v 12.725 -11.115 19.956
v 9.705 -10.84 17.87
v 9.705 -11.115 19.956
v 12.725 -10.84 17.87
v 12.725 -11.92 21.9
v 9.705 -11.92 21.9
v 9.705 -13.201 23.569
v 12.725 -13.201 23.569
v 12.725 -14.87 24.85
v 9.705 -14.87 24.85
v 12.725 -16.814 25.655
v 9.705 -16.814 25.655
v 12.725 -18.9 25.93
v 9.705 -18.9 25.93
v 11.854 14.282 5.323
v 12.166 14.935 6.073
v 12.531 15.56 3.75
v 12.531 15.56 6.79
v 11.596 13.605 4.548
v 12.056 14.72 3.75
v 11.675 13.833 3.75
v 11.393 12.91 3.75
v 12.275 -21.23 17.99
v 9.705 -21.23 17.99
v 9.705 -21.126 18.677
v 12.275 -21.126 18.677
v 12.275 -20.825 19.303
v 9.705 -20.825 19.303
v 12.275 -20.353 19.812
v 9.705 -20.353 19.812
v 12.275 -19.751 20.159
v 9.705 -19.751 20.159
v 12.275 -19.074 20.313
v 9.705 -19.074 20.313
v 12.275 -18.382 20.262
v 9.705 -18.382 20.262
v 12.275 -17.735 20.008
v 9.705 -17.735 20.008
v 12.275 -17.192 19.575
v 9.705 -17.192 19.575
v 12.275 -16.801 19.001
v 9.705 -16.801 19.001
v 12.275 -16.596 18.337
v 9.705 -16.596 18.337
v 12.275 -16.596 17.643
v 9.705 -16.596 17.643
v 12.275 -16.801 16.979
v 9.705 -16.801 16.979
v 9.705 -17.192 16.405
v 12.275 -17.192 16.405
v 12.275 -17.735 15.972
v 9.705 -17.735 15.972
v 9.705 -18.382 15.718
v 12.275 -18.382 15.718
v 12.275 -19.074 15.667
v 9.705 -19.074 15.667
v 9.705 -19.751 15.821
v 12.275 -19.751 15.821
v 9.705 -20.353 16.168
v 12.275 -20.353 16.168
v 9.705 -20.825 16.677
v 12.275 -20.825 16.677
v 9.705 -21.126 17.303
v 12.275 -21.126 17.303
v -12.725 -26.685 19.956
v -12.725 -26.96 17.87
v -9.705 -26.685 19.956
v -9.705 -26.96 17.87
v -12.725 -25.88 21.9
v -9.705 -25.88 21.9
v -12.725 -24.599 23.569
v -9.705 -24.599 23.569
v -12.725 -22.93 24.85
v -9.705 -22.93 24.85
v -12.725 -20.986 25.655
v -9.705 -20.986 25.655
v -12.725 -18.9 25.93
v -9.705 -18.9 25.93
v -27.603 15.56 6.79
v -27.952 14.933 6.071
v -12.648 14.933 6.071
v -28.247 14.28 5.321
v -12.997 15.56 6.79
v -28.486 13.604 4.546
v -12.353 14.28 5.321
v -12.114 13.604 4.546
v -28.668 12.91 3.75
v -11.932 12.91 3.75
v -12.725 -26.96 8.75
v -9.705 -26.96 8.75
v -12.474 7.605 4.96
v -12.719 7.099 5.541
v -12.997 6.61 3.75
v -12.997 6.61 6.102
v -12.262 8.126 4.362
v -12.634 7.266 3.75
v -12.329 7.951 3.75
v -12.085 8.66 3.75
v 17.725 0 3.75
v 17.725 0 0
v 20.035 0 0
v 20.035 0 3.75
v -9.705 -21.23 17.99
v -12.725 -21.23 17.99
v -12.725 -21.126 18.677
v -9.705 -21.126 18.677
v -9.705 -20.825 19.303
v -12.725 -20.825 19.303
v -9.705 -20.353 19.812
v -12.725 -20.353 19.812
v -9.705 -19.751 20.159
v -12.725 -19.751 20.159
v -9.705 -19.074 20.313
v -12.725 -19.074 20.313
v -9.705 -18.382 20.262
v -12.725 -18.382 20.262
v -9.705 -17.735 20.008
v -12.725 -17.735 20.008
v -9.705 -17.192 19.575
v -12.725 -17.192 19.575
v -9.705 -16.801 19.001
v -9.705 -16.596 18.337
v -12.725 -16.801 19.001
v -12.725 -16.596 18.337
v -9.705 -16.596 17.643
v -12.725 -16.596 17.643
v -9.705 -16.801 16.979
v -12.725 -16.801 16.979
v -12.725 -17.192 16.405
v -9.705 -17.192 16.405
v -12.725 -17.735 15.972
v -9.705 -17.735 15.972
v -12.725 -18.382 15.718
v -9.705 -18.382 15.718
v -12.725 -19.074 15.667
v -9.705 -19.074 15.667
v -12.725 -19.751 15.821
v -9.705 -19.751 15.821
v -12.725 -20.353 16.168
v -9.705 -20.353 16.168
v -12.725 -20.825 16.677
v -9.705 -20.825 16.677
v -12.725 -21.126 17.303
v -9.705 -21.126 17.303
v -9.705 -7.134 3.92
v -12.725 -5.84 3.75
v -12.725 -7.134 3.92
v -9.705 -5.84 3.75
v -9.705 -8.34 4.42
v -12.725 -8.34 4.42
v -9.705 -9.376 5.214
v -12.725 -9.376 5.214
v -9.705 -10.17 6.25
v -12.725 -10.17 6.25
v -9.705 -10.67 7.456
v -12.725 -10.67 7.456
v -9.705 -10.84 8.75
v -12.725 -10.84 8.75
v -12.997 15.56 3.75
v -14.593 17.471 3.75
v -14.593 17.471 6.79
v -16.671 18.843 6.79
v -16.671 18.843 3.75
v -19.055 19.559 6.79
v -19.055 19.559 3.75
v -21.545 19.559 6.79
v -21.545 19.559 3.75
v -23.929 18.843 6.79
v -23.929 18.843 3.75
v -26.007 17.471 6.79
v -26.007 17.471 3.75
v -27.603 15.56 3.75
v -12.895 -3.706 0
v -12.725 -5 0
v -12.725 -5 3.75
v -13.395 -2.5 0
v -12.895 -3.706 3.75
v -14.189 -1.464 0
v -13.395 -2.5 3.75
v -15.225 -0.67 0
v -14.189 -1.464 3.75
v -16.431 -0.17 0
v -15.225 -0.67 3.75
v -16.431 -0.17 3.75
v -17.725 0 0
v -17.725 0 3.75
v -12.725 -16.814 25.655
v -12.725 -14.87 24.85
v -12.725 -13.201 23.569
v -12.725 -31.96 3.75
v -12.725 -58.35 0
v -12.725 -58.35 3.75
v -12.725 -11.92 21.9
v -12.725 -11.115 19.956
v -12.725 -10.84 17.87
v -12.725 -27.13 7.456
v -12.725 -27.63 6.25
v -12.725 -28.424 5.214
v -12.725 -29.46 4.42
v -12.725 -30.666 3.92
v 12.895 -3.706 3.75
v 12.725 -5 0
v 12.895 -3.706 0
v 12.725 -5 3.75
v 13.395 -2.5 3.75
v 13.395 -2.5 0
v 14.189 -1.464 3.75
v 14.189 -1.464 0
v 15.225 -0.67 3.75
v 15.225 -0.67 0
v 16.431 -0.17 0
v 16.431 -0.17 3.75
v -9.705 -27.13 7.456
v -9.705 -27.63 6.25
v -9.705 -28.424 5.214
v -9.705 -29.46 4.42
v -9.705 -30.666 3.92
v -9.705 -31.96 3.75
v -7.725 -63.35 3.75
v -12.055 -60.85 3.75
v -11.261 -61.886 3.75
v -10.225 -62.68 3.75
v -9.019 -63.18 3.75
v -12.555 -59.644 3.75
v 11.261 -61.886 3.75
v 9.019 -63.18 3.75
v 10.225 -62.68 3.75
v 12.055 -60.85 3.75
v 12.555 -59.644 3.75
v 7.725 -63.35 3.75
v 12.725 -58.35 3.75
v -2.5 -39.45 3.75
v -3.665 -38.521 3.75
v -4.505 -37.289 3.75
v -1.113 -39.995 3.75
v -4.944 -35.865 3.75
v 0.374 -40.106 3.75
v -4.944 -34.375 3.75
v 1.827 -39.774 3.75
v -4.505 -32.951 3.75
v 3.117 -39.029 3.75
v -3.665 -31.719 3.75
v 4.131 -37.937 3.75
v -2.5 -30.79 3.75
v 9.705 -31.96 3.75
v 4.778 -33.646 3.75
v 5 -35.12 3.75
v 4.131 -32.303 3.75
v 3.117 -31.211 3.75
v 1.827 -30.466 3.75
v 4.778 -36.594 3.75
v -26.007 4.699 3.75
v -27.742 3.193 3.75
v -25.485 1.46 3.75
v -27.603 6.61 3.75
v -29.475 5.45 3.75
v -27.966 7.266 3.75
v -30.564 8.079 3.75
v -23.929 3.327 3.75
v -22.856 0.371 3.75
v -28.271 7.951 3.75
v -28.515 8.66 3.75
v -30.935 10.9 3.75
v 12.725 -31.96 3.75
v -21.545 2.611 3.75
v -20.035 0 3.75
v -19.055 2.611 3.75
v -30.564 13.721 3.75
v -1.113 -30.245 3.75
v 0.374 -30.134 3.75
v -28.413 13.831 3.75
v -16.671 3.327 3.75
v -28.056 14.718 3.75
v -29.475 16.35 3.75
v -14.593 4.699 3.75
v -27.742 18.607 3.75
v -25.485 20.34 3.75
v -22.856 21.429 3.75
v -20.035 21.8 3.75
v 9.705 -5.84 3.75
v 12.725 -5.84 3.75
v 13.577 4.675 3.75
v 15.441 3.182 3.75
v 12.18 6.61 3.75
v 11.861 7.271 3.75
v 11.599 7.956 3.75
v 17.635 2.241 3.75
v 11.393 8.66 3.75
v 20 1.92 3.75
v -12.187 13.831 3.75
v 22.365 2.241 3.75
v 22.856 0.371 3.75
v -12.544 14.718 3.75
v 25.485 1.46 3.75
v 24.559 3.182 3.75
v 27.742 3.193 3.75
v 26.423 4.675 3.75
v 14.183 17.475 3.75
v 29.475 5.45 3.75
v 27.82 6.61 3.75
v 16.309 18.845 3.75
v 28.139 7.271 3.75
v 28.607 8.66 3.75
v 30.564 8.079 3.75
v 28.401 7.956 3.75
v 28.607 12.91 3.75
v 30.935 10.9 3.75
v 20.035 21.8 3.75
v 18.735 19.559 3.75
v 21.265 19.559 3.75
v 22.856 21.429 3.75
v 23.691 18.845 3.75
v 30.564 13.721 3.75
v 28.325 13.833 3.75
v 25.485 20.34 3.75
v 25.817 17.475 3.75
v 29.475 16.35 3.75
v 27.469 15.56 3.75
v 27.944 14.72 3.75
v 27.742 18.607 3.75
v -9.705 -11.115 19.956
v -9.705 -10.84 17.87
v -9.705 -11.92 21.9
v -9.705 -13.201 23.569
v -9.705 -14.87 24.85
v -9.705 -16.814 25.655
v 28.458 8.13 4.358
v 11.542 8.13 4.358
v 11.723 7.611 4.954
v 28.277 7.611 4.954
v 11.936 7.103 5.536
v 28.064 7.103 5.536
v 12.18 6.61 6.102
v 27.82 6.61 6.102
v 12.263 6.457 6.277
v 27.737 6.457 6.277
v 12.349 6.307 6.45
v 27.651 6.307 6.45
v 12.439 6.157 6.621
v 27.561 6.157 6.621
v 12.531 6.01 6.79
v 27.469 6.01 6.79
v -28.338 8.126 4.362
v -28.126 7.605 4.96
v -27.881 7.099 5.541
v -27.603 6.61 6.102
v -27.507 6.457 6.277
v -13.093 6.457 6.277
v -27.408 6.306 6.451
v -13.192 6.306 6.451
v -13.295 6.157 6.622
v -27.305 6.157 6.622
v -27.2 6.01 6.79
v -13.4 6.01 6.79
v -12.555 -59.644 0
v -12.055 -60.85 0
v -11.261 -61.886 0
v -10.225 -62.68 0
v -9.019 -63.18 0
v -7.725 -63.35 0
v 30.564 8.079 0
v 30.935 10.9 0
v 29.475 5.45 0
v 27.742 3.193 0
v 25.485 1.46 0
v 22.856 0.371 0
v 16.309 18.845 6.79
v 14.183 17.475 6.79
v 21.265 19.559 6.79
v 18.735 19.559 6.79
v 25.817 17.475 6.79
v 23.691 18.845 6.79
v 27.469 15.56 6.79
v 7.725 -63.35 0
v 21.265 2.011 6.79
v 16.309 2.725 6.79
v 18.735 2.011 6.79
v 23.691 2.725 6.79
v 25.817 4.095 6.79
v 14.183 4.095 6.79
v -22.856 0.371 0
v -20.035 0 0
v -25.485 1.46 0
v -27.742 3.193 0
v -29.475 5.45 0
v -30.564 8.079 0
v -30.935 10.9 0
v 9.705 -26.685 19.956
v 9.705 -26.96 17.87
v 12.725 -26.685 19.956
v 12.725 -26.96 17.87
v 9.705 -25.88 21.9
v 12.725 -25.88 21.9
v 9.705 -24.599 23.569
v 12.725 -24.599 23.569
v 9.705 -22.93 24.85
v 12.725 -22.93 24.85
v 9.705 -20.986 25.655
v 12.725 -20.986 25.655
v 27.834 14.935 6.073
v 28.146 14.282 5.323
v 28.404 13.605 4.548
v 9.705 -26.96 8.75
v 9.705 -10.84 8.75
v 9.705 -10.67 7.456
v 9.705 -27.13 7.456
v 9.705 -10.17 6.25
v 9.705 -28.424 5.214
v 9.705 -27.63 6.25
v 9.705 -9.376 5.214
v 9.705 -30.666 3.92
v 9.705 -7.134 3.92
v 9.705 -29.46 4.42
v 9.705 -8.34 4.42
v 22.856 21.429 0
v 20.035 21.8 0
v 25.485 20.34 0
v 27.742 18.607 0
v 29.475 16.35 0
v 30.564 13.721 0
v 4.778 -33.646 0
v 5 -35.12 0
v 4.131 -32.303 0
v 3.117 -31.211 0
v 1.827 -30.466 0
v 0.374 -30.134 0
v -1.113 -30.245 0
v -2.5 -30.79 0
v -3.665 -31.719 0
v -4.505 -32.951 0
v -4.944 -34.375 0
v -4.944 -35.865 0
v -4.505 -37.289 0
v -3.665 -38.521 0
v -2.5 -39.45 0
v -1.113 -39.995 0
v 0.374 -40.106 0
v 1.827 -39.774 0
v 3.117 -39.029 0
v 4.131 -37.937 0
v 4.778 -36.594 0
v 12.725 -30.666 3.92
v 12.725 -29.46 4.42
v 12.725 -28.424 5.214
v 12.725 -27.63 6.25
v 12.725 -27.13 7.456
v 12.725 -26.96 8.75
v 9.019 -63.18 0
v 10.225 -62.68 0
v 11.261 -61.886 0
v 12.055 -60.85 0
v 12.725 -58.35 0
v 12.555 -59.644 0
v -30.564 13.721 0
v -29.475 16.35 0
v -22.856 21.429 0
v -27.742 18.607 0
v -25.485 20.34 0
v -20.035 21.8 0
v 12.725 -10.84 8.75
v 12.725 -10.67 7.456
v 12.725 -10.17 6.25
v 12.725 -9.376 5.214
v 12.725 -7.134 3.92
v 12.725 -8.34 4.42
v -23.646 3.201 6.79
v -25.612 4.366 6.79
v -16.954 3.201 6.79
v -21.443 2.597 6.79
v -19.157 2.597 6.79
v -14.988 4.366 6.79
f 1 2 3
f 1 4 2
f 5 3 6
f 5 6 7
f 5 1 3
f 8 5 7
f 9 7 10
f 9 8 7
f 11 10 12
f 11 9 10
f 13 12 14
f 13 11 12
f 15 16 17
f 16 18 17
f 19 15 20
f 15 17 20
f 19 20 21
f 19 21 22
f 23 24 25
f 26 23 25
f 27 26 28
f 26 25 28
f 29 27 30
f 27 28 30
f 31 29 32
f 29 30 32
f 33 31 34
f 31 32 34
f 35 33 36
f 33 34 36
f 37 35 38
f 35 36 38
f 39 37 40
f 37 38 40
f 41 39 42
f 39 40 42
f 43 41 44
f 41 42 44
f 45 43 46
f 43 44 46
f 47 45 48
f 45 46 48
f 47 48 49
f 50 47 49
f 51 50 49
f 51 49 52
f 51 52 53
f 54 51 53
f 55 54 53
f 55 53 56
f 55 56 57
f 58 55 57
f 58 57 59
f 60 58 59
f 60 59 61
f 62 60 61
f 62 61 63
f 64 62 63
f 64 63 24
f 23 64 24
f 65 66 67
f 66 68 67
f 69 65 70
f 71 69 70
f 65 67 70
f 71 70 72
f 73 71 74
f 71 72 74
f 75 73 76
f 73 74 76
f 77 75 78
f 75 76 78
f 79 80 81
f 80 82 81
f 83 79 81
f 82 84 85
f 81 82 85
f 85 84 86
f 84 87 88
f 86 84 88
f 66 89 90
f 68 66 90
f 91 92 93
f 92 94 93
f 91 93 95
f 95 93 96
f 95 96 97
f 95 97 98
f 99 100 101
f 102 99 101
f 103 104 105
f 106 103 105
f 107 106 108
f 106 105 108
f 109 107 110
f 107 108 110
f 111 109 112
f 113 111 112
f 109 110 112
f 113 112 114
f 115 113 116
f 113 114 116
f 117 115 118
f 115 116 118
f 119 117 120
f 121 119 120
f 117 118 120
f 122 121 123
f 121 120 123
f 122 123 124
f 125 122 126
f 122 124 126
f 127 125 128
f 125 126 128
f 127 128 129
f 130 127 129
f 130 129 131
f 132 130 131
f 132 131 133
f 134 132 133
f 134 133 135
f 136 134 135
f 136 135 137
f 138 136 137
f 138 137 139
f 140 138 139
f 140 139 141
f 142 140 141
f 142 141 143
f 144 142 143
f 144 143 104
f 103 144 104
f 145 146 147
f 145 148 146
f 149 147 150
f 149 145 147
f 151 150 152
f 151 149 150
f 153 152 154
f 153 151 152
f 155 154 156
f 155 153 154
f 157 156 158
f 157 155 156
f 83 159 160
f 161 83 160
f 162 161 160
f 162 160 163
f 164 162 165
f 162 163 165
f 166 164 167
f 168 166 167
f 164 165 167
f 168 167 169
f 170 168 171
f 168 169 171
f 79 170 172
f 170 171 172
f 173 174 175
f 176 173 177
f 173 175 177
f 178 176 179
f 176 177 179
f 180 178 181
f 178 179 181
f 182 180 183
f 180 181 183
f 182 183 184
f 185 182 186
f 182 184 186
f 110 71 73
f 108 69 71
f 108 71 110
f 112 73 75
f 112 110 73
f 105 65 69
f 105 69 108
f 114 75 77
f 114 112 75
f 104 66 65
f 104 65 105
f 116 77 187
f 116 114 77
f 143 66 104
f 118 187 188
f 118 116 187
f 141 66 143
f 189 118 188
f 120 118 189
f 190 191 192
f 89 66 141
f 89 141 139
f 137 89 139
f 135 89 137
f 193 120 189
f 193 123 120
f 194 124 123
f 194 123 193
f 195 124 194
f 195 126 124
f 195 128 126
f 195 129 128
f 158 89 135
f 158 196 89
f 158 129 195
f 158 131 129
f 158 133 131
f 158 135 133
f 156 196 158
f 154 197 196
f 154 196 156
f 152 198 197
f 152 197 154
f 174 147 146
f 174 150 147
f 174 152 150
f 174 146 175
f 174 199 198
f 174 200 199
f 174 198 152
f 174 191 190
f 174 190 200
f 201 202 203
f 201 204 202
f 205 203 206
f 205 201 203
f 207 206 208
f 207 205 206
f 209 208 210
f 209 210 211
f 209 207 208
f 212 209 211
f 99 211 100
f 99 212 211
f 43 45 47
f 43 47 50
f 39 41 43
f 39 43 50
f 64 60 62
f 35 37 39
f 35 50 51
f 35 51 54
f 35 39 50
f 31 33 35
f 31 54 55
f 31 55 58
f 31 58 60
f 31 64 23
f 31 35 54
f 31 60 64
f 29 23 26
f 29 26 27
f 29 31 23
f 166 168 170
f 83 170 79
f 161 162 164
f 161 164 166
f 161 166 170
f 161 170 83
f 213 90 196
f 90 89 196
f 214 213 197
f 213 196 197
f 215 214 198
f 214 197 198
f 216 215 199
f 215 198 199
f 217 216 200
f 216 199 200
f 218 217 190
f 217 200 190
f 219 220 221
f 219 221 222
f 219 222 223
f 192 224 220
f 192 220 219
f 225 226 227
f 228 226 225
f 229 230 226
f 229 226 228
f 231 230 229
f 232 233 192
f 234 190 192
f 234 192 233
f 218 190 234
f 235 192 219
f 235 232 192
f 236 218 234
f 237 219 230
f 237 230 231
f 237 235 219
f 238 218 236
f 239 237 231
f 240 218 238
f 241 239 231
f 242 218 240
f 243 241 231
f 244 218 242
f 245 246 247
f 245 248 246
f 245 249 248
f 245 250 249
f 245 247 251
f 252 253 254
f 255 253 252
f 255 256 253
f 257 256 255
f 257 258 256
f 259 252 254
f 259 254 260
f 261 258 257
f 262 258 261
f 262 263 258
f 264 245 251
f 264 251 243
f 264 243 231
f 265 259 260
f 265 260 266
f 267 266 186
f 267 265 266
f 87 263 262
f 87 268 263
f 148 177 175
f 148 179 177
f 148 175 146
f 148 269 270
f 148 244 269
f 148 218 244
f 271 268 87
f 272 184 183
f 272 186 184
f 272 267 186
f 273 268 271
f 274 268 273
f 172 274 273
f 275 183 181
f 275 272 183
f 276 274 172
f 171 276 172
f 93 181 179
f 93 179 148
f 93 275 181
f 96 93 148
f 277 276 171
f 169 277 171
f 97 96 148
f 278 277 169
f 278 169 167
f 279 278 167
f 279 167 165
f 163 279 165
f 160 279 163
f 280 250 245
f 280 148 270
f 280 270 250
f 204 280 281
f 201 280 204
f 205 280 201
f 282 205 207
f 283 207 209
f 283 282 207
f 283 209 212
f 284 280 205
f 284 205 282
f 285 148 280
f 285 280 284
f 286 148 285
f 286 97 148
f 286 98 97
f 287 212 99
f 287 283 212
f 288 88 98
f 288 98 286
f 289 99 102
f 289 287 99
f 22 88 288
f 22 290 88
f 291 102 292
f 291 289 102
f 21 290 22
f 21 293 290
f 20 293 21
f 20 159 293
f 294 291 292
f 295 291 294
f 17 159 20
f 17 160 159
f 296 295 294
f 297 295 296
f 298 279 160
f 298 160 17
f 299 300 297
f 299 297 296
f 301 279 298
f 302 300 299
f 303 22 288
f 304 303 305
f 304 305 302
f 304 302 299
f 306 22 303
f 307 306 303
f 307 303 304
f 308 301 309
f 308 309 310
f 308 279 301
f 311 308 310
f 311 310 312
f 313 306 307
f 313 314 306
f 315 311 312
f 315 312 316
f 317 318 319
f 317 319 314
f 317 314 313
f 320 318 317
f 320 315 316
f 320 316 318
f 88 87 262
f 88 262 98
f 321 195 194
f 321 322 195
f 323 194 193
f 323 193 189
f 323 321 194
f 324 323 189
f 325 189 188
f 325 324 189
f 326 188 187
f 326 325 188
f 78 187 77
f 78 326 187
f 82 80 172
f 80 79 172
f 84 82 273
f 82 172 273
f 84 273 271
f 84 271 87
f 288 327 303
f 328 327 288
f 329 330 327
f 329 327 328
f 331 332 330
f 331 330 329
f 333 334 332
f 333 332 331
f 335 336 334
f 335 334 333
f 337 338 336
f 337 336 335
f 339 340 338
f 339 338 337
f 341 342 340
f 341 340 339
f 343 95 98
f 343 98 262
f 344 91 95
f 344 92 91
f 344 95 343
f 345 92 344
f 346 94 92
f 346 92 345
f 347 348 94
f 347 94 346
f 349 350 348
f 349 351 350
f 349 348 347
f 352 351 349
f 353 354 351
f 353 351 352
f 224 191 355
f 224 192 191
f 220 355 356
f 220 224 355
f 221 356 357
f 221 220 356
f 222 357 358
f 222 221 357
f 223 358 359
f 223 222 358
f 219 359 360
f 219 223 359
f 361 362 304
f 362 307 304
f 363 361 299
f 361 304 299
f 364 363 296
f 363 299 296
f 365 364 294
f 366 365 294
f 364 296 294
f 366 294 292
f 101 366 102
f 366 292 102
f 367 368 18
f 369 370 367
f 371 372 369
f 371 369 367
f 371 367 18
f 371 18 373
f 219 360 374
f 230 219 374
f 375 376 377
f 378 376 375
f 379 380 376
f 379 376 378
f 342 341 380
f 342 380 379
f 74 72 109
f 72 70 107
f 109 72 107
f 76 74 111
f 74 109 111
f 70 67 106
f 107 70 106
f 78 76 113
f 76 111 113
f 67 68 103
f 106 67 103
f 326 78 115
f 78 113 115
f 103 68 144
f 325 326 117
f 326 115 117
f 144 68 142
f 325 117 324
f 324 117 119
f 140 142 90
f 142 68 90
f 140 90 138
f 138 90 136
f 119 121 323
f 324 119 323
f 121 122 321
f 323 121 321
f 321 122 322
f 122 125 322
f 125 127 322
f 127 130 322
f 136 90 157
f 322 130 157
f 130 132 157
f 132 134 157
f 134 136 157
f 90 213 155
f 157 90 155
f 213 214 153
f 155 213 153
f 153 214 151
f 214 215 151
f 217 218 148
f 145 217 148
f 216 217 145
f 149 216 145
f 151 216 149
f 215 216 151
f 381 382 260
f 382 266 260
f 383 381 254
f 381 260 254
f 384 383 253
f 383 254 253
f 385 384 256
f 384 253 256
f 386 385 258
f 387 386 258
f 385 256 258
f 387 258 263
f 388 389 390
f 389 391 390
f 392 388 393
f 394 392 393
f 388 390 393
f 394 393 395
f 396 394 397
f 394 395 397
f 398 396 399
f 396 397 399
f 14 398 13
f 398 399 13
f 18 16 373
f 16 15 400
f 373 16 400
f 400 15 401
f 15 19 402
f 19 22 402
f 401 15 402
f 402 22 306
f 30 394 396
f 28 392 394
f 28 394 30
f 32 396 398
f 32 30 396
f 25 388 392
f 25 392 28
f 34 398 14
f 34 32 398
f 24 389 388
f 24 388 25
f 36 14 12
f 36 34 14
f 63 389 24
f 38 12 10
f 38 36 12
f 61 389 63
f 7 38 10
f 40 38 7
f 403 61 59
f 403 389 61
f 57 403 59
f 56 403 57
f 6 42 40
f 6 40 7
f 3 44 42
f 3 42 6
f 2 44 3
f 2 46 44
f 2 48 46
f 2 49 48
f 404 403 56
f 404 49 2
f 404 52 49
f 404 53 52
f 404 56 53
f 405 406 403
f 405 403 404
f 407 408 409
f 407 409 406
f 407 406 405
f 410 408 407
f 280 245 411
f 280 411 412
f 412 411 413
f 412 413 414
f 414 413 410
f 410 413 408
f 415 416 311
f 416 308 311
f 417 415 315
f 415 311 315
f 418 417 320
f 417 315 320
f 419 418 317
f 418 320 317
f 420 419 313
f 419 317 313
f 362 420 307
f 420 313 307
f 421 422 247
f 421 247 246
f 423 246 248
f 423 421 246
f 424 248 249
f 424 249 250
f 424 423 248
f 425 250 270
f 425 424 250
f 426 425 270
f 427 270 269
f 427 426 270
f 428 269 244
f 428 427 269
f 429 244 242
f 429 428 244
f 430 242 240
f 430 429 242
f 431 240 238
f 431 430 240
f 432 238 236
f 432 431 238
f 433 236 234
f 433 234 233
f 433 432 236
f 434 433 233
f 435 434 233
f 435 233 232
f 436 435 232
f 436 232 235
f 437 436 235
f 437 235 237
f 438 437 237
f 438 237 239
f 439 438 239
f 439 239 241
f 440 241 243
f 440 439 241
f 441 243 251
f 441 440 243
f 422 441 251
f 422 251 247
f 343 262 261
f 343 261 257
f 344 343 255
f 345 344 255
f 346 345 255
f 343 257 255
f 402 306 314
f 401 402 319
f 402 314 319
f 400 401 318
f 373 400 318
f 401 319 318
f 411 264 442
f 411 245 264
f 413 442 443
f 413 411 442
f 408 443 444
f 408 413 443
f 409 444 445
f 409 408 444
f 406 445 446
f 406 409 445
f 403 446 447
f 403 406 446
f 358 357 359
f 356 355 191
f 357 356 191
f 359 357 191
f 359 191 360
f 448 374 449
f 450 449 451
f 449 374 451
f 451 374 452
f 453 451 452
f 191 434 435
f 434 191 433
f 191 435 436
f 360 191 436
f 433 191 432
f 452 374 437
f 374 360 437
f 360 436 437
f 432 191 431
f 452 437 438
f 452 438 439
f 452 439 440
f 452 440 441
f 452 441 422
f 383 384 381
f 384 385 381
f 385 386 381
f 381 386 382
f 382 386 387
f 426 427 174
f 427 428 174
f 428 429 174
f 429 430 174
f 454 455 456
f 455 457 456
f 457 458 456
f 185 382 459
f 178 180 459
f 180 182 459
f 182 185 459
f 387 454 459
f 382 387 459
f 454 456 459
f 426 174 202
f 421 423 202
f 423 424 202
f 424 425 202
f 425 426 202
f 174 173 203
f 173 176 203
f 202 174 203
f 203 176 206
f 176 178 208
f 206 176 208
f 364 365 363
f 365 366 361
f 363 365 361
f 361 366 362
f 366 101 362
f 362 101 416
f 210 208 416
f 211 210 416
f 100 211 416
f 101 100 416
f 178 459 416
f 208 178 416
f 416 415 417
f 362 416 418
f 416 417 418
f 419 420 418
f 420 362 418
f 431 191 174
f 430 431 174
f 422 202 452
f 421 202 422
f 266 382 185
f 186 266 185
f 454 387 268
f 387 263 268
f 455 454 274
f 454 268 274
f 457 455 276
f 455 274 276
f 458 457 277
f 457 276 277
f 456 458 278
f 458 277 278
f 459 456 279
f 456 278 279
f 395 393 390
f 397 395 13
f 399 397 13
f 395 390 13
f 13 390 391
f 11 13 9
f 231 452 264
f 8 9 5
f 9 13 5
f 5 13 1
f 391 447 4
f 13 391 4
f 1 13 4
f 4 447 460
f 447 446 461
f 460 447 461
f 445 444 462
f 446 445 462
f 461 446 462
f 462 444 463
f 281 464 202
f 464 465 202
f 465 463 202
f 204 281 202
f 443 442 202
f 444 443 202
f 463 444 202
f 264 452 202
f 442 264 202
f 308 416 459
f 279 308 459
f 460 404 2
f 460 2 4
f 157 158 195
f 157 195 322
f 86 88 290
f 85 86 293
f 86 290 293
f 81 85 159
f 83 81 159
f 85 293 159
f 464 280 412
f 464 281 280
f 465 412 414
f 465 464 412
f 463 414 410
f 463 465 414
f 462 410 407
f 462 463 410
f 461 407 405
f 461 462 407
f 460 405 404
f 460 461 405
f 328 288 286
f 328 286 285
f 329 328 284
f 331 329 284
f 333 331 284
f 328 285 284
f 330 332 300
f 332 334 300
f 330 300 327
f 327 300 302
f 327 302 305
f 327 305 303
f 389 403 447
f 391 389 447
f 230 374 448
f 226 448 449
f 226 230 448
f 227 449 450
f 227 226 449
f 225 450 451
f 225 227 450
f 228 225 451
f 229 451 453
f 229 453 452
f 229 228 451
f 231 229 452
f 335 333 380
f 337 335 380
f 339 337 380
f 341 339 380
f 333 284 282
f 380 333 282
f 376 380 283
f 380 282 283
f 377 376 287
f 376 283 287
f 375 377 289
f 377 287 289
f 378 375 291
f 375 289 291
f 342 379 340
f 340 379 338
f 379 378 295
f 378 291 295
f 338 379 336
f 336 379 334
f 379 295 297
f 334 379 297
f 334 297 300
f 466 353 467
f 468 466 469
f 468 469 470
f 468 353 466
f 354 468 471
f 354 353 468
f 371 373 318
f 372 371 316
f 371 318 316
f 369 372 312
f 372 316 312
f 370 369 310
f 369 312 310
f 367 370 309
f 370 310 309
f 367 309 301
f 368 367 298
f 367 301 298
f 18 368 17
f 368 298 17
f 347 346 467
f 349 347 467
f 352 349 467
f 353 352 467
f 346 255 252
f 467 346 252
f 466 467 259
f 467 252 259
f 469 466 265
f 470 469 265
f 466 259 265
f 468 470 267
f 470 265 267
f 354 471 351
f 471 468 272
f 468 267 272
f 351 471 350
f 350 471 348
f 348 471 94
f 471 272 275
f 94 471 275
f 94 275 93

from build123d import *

# Parameters (mm, degrees)
F0_R       = 5
F1_DEPTH   = 3.75
F0_W       = 3.02
F0_H       = 16.12
F2_DEPTH   = 25.93
F3_DEPTH   = 6.79
F4_DEPTH   = 6.79
F5_SIZE2   = 3.03999
F5_SIZE    = 2.64999
F5_2_SIZE2 = 3.03999
F5_2_SIZE  = 2.64999
F6_SIZE2   = 2.64999
F6_SIZE    = 3.03999
F6_2_SIZE2 = 2.64999
F6_2_SIZE  = 3.03999
F7_R       = 2.33
F8_DEPTH   = 25
F9_R       = 8.05999
F10_R      = 5
F11_R      = 10.89999


# Not quite as in the source:
# - a fillet or chamfer is up to 0.001 mm smaller than in the source, because OpenCascade refuses the exact size


with BuildPart() as f1:
    # F0 (on Top) → F1 (new body)
    with BuildSketch(Plane.XY):
        Polygon((-30.935, 0), (-12.725, 0), (12.725, 0), (30.935, 0), (30.935, 21.8), (-30.935, 21.8), align=None)
        with BuildLine():
            ThreePointArc((-11.9316907323, 12.91), (-11.7843146524, 12.0027843216), (-11.735, 11.085))
            ThreePointArc((-11.735, 11.085), (-11.8230688054, 9.8599030561), (-12.0854641032, 8.66))
            ThreePointArc((-12.0854641032, 8.66), (-12.4738263465, 7.6050242897), (-12.9970143092, 6.61))
            ThreePointArc((-12.9970143092, 6.61), (-20.3, 2.52), (-27.6029856908, 6.61))
            ThreePointArc((-27.6029856908, 6.61), (-28.1261736535, 7.6050242897), (-28.5145358968, 8.66))
            ThreePointArc((-28.5145358968, 8.66), (-28.8593991283, 10.7753040808), (-28.6683092677, 12.91))
            ThreePointArc((-28.6683092677, 12.91), (-28.2468859573, 14.2797188579), (-27.6029856908, 15.56))
            ThreePointArc((-27.6029856908, 15.56), (-20.3, 19.65), (-12.9970143092, 15.56))
            ThreePointArc((-12.9970143092, 15.56), (-12.3531140427, 14.2797188579), (-11.9316907323, 12.91))
        make_face(mode=Mode.SUBTRACT)
        with BuildLine():
            ThreePointArc((28.6065440218, 12.91), (28.8001487986, 11.8553299132), (28.865, 10.785))
            ThreePointArc((28.865, 10.785), (28.8001487986, 9.7146700868), (28.6065440218, 8.66))
            ThreePointArc((28.6065440218, 8.66), (28.2771488358, 7.6105658536), (27.8203324738, 6.61))
            ThreePointArc((27.8203324738, 6.61), (20, 1.92), (12.1796675262, 6.61))
            ThreePointArc((12.1796675262, 6.61), (11.7228511642, 7.6105658536), (11.3934559782, 8.66))
            ThreePointArc((11.3934559782, 8.66), (11.135, 10.785), (11.3934559782, 12.91))
            ThreePointArc((11.3934559782, 12.91), (11.8536949602, 14.2815610531), (12.5308902806, 15.56))
            ThreePointArc((12.5308902806, 15.56), (20, 19.65), (27.4691097194, 15.56))
            ThreePointArc((27.4691097194, 15.56), (28.1463050398, 14.2815610531), (28.6065440218, 12.91))
        make_face(mode=Mode.SUBTRACT)
        Polygon((12.725, 0), (-12.725, 0), (-12.725, -10.84), (-9.705, -10.84), (-9.705, -26.96), (-12.725, -26.96), (-12.725, -63.35), (12.725, -63.35), (12.725, -26.96), (9.705, -26.96), (9.705, -10.84), (12.725, -10.84), align=None)
        with Locations((0, -35.12)):
            Circle(F0_R, mode=Mode.SUBTRACT)
        with BuildLine():
            ThreePointArc((-12.0854641032, 8.66), (-11.8230688054, 9.8599030561), (-11.735, 11.085))
            ThreePointArc((-11.735, 11.085), (-11.7843146524, 12.0027843216), (-11.9316907323, 12.91))
            Line((-11.9316907323, 12.91), (-28.6683092677, 12.91))
            ThreePointArc((-28.6683092677, 12.91), (-28.8593991283, 10.7753040808), (-28.5145358968, 8.66))
            Line((-28.5145358968, 8.66), (-12.0854641032, 8.66))
        make_face()
        with BuildLine():
            ThreePointArc((28.6065440218, 8.66), (28.8001487986, 9.7146700868), (28.865, 10.785))
            ThreePointArc((28.865, 10.785), (28.8001487986, 11.8553299132), (28.6065440218, 12.91))
            Line((28.6065440218, 12.91), (11.3934559782, 12.91))
            ThreePointArc((11.3934559782, 12.91), (11.135, 10.785), (11.3934559782, 8.66))
            Line((11.3934559782, 8.66), (28.6065440218, 8.66))
        make_face()
    extrude(amount=F1_DEPTH)

    # F0 (on Top) → F2 (join)
    with BuildSketch(Plane.XY):
        with Locations((-11.215, -18.9)):
            Rectangle(F0_W, F0_H)
        with Locations((11.215, -18.9)):
            Rectangle(F0_W, F0_H)
    extrude(amount=F2_DEPTH)

    # F0 (on Top) → F3 (join)
    with BuildSketch(Plane.XY):
        with BuildLine():
            Line((-27.6029856908, 15.56), (-12.9970143092, 15.56))
            ThreePointArc((-12.9970143092, 15.56), (-20.3, 19.65), (-27.6029856908, 15.56))
        make_face()
        with BuildLine():
            ThreePointArc((-27.6029856908, 6.61), (-20.3, 2.52), (-12.9970143092, 6.61))
            Line((-12.9970143092, 6.61), (-27.6029856908, 6.61))
        make_face()
        with BuildLine():
            ThreePointArc((12.1796675262, 6.61), (20, 1.92), (27.8203324738, 6.61))
            Line((27.8203324738, 6.61), (12.1796675262, 6.61))
        make_face()
        with BuildLine():
            Line((12.5308902806, 15.56), (27.4691097194, 15.56))
            ThreePointArc((27.4691097194, 15.56), (20, 19.65), (12.5308902806, 15.56))
        make_face()
    extrude(amount=F3_DEPTH)

    # F0 (on Top) → F4 (join)
    with BuildSketch(Plane.XY):
        with BuildLine():
            Line((-28.6683092677, 12.91), (-11.9316907323, 12.91))
            ThreePointArc((-11.9316907323, 12.91), (-12.3531140427, 14.2797188579), (-12.9970143092, 15.56))
            Line((-12.9970143092, 15.56), (-27.6029856908, 15.56))
            ThreePointArc((-27.6029856908, 15.56), (-28.2468859573, 14.2797188579), (-28.6683092677, 12.91))
        make_face()
        with BuildLine():
            ThreePointArc((-12.9970143092, 6.61), (-12.4738263465, 7.6050242897), (-12.0854641032, 8.66))
            Line((-12.0854641032, 8.66), (-28.5145358968, 8.66))
            ThreePointArc((-28.5145358968, 8.66), (-28.1261736535, 7.6050242897), (-27.6029856908, 6.61))
            Line((-27.6029856908, 6.61), (-12.9970143092, 6.61))
        make_face()
        with BuildLine():
            ThreePointArc((27.8203324738, 6.61), (28.2771488358, 7.6105658536), (28.6065440218, 8.66))
            Line((28.6065440218, 8.66), (11.3934559782, 8.66))
            ThreePointArc((11.3934559782, 8.66), (11.7228511642, 7.6105658536), (12.1796675262, 6.61))
            Line((12.1796675262, 6.61), (27.8203324738, 6.61))
        make_face()
        with BuildLine():
            Line((11.3934559782, 12.91), (28.6065440218, 12.91))
            ThreePointArc((28.6065440218, 12.91), (28.1463050398, 14.2815610531), (27.4691097194, 15.56))
            Line((27.4691097194, 15.56), (12.5308902806, 15.56))
            ThreePointArc((12.5308902806, 15.56), (11.8536949602, 14.2815610531), (11.3934559782, 12.91))
        make_face()
    extrude(amount=F4_DEPTH)

    # F5 (size 2.65 and 3.04 in the source; OpenCascade refuses exactly that, so slightly less here)
    f5_edges = [f1.edges().sort_by_distance(p)[0] for p in [
        (-20.3, 12.91, 6.79),
    ]]
    f5_side = f1.faces().sort_by_distance((-20.3, 15.724453, 6.79))[0]
    chamfer(f5_edges, length=F5_SIZE, length2=F5_SIZE2, reference=f5_side)

    # F5#2 (size 2.65 and 3.04 in the source; OpenCascade refuses exactly that, so slightly less here)
    f5_2_edges = [f1.edges().sort_by_distance(p)[0] for p in [
        (20, 12.91, 6.79),
    ]]
    f5_2_side = f1.faces().sort_by_distance((20, 15.719253, 6.79))[0]
    chamfer(f5_2_edges, length=F5_2_SIZE, length2=F5_2_SIZE2, reference=f5_2_side)

    # F6 (size 3.04 and 2.65 in the source; OpenCascade refuses exactly that, so slightly less here)
    f6_edges = [f1.edges().sort_by_distance(p)[0] for p in [
        (-20.3, 8.66, 6.79),
    ]]
    f6_side = f1.faces().sort_by_distance((-20.3, 8.66, 5.27))[0]
    chamfer(f6_edges, length=F6_SIZE, length2=F6_SIZE2, reference=f6_side)

    # F6#2 (size 3.04 and 2.65 in the source; OpenCascade refuses exactly that, so slightly less here)
    f6_2_edges = [f1.edges().sort_by_distance(p)[0] for p in [
        (20, 8.66, 6.79),
    ]]
    f6_2_side = f1.faces().sort_by_distance((20, 8.66, 5.27))[0]
    chamfer(f6_2_edges, length=F6_2_SIZE, length2=F6_2_SIZE2, reference=f6_2_side)

    # F7 (on face) → F8 (cut)
    with BuildSketch(Plane(origin=(-12.725, 0, 0), x_dir=(0, -1, 0), z_dir=(-1, 0, 0))):
        with Locations((18.9, 17.99)):
            Circle(F7_R)
    extrude(amount=-F8_DEPTH, mode=Mode.SUBTRACT)

    # F9 (radius 8.06 in the source; OpenCascade refuses exactly that, so slightly less here)
    f9_edges = [f1.edges().sort_by_distance(p)[0] for p in [
        (-11.215, -10.84, 25.93),
        (11.215, -10.84, 25.93),
        (11.215, -26.96, 25.93),
        (-11.215, -26.96, 25.93),
    ]]
    fillet(f9_edges, radius=F9_R)

    # F10
    f10_edges = [f1.edges().sort_by_distance(p)[0] for p in [
        (-12.725, 0, 1.875),
        (12.725, 0, 1.875),
        (12.725, -63.35, 1.875),
        (-12.725, -63.35, 1.875),
        (-11.215, -26.96, 3.75),
        (11.215, -26.96, 3.75),
        (11.215, -10.84, 3.75),
        (-11.215, -10.84, 3.75),
    ]]
    fillet(f10_edges, radius=F10_R)

    # F11 (radius 10.9 in the source; OpenCascade refuses exactly that, so slightly less here)
    f11_edges = [f1.edges().sort_by_distance(p)[0] for p in [
        (-30.935, 21.8, 1.875),
        (-30.935, 0, 1.875),
        (30.935, 21.8, 1.875),
        (30.935, 0, 1.875),
    ]]
    fillet(f11_edges, radius=F11_R)


solid = f1.part
